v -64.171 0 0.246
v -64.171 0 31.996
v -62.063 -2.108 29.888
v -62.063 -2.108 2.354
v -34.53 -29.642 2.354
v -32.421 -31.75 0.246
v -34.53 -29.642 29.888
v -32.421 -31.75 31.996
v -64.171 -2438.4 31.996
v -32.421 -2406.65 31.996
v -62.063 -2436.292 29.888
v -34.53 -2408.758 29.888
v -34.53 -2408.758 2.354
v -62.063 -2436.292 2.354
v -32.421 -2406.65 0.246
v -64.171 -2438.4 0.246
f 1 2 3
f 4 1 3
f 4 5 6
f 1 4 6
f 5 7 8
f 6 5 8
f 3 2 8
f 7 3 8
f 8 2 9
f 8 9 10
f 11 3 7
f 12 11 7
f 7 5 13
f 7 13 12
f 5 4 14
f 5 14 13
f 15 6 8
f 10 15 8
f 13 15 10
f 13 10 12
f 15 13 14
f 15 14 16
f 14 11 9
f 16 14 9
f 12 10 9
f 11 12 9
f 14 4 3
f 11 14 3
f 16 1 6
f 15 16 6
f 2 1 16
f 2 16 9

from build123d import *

# Parameters (mm, degrees)
F0_W     = 31.75
F0_H     = 31.75
F0_W_2   = 27.5336
F0_H_2   = 27.5336
F1_DEPTH = 2438.4
F3_DEPTH = 76.2


with BuildPart() as f1:
    # F0 (on Front) → F1 (new body)
    with BuildSketch(Plane.XZ):
        with Locations((-48.296367, 16.120737)):
            Rectangle(F0_W, F0_H)
        with Locations((-48.296367, 16.120737)):
            Rectangle(F0_W_2, F0_H_2, mode=Mode.SUBTRACT)
    extrude(amount=F1_DEPTH)

    # F2 (on face) → F3 (cut)
    with BuildSketch(Plane.XY.offset(31.995737)):
        Polygon((-32.421367, 0), (-64.171367, 0), (-32.421367, -31.75), align=None)
        Polygon((-32.421367, -2406.65), (-64.171367, -2438.4), (-32.421367, -2438.4), align=None)
    extrude(amount=-F3_DEPTH, mode=Mode.SUBTRACT)


solid = f1.part
